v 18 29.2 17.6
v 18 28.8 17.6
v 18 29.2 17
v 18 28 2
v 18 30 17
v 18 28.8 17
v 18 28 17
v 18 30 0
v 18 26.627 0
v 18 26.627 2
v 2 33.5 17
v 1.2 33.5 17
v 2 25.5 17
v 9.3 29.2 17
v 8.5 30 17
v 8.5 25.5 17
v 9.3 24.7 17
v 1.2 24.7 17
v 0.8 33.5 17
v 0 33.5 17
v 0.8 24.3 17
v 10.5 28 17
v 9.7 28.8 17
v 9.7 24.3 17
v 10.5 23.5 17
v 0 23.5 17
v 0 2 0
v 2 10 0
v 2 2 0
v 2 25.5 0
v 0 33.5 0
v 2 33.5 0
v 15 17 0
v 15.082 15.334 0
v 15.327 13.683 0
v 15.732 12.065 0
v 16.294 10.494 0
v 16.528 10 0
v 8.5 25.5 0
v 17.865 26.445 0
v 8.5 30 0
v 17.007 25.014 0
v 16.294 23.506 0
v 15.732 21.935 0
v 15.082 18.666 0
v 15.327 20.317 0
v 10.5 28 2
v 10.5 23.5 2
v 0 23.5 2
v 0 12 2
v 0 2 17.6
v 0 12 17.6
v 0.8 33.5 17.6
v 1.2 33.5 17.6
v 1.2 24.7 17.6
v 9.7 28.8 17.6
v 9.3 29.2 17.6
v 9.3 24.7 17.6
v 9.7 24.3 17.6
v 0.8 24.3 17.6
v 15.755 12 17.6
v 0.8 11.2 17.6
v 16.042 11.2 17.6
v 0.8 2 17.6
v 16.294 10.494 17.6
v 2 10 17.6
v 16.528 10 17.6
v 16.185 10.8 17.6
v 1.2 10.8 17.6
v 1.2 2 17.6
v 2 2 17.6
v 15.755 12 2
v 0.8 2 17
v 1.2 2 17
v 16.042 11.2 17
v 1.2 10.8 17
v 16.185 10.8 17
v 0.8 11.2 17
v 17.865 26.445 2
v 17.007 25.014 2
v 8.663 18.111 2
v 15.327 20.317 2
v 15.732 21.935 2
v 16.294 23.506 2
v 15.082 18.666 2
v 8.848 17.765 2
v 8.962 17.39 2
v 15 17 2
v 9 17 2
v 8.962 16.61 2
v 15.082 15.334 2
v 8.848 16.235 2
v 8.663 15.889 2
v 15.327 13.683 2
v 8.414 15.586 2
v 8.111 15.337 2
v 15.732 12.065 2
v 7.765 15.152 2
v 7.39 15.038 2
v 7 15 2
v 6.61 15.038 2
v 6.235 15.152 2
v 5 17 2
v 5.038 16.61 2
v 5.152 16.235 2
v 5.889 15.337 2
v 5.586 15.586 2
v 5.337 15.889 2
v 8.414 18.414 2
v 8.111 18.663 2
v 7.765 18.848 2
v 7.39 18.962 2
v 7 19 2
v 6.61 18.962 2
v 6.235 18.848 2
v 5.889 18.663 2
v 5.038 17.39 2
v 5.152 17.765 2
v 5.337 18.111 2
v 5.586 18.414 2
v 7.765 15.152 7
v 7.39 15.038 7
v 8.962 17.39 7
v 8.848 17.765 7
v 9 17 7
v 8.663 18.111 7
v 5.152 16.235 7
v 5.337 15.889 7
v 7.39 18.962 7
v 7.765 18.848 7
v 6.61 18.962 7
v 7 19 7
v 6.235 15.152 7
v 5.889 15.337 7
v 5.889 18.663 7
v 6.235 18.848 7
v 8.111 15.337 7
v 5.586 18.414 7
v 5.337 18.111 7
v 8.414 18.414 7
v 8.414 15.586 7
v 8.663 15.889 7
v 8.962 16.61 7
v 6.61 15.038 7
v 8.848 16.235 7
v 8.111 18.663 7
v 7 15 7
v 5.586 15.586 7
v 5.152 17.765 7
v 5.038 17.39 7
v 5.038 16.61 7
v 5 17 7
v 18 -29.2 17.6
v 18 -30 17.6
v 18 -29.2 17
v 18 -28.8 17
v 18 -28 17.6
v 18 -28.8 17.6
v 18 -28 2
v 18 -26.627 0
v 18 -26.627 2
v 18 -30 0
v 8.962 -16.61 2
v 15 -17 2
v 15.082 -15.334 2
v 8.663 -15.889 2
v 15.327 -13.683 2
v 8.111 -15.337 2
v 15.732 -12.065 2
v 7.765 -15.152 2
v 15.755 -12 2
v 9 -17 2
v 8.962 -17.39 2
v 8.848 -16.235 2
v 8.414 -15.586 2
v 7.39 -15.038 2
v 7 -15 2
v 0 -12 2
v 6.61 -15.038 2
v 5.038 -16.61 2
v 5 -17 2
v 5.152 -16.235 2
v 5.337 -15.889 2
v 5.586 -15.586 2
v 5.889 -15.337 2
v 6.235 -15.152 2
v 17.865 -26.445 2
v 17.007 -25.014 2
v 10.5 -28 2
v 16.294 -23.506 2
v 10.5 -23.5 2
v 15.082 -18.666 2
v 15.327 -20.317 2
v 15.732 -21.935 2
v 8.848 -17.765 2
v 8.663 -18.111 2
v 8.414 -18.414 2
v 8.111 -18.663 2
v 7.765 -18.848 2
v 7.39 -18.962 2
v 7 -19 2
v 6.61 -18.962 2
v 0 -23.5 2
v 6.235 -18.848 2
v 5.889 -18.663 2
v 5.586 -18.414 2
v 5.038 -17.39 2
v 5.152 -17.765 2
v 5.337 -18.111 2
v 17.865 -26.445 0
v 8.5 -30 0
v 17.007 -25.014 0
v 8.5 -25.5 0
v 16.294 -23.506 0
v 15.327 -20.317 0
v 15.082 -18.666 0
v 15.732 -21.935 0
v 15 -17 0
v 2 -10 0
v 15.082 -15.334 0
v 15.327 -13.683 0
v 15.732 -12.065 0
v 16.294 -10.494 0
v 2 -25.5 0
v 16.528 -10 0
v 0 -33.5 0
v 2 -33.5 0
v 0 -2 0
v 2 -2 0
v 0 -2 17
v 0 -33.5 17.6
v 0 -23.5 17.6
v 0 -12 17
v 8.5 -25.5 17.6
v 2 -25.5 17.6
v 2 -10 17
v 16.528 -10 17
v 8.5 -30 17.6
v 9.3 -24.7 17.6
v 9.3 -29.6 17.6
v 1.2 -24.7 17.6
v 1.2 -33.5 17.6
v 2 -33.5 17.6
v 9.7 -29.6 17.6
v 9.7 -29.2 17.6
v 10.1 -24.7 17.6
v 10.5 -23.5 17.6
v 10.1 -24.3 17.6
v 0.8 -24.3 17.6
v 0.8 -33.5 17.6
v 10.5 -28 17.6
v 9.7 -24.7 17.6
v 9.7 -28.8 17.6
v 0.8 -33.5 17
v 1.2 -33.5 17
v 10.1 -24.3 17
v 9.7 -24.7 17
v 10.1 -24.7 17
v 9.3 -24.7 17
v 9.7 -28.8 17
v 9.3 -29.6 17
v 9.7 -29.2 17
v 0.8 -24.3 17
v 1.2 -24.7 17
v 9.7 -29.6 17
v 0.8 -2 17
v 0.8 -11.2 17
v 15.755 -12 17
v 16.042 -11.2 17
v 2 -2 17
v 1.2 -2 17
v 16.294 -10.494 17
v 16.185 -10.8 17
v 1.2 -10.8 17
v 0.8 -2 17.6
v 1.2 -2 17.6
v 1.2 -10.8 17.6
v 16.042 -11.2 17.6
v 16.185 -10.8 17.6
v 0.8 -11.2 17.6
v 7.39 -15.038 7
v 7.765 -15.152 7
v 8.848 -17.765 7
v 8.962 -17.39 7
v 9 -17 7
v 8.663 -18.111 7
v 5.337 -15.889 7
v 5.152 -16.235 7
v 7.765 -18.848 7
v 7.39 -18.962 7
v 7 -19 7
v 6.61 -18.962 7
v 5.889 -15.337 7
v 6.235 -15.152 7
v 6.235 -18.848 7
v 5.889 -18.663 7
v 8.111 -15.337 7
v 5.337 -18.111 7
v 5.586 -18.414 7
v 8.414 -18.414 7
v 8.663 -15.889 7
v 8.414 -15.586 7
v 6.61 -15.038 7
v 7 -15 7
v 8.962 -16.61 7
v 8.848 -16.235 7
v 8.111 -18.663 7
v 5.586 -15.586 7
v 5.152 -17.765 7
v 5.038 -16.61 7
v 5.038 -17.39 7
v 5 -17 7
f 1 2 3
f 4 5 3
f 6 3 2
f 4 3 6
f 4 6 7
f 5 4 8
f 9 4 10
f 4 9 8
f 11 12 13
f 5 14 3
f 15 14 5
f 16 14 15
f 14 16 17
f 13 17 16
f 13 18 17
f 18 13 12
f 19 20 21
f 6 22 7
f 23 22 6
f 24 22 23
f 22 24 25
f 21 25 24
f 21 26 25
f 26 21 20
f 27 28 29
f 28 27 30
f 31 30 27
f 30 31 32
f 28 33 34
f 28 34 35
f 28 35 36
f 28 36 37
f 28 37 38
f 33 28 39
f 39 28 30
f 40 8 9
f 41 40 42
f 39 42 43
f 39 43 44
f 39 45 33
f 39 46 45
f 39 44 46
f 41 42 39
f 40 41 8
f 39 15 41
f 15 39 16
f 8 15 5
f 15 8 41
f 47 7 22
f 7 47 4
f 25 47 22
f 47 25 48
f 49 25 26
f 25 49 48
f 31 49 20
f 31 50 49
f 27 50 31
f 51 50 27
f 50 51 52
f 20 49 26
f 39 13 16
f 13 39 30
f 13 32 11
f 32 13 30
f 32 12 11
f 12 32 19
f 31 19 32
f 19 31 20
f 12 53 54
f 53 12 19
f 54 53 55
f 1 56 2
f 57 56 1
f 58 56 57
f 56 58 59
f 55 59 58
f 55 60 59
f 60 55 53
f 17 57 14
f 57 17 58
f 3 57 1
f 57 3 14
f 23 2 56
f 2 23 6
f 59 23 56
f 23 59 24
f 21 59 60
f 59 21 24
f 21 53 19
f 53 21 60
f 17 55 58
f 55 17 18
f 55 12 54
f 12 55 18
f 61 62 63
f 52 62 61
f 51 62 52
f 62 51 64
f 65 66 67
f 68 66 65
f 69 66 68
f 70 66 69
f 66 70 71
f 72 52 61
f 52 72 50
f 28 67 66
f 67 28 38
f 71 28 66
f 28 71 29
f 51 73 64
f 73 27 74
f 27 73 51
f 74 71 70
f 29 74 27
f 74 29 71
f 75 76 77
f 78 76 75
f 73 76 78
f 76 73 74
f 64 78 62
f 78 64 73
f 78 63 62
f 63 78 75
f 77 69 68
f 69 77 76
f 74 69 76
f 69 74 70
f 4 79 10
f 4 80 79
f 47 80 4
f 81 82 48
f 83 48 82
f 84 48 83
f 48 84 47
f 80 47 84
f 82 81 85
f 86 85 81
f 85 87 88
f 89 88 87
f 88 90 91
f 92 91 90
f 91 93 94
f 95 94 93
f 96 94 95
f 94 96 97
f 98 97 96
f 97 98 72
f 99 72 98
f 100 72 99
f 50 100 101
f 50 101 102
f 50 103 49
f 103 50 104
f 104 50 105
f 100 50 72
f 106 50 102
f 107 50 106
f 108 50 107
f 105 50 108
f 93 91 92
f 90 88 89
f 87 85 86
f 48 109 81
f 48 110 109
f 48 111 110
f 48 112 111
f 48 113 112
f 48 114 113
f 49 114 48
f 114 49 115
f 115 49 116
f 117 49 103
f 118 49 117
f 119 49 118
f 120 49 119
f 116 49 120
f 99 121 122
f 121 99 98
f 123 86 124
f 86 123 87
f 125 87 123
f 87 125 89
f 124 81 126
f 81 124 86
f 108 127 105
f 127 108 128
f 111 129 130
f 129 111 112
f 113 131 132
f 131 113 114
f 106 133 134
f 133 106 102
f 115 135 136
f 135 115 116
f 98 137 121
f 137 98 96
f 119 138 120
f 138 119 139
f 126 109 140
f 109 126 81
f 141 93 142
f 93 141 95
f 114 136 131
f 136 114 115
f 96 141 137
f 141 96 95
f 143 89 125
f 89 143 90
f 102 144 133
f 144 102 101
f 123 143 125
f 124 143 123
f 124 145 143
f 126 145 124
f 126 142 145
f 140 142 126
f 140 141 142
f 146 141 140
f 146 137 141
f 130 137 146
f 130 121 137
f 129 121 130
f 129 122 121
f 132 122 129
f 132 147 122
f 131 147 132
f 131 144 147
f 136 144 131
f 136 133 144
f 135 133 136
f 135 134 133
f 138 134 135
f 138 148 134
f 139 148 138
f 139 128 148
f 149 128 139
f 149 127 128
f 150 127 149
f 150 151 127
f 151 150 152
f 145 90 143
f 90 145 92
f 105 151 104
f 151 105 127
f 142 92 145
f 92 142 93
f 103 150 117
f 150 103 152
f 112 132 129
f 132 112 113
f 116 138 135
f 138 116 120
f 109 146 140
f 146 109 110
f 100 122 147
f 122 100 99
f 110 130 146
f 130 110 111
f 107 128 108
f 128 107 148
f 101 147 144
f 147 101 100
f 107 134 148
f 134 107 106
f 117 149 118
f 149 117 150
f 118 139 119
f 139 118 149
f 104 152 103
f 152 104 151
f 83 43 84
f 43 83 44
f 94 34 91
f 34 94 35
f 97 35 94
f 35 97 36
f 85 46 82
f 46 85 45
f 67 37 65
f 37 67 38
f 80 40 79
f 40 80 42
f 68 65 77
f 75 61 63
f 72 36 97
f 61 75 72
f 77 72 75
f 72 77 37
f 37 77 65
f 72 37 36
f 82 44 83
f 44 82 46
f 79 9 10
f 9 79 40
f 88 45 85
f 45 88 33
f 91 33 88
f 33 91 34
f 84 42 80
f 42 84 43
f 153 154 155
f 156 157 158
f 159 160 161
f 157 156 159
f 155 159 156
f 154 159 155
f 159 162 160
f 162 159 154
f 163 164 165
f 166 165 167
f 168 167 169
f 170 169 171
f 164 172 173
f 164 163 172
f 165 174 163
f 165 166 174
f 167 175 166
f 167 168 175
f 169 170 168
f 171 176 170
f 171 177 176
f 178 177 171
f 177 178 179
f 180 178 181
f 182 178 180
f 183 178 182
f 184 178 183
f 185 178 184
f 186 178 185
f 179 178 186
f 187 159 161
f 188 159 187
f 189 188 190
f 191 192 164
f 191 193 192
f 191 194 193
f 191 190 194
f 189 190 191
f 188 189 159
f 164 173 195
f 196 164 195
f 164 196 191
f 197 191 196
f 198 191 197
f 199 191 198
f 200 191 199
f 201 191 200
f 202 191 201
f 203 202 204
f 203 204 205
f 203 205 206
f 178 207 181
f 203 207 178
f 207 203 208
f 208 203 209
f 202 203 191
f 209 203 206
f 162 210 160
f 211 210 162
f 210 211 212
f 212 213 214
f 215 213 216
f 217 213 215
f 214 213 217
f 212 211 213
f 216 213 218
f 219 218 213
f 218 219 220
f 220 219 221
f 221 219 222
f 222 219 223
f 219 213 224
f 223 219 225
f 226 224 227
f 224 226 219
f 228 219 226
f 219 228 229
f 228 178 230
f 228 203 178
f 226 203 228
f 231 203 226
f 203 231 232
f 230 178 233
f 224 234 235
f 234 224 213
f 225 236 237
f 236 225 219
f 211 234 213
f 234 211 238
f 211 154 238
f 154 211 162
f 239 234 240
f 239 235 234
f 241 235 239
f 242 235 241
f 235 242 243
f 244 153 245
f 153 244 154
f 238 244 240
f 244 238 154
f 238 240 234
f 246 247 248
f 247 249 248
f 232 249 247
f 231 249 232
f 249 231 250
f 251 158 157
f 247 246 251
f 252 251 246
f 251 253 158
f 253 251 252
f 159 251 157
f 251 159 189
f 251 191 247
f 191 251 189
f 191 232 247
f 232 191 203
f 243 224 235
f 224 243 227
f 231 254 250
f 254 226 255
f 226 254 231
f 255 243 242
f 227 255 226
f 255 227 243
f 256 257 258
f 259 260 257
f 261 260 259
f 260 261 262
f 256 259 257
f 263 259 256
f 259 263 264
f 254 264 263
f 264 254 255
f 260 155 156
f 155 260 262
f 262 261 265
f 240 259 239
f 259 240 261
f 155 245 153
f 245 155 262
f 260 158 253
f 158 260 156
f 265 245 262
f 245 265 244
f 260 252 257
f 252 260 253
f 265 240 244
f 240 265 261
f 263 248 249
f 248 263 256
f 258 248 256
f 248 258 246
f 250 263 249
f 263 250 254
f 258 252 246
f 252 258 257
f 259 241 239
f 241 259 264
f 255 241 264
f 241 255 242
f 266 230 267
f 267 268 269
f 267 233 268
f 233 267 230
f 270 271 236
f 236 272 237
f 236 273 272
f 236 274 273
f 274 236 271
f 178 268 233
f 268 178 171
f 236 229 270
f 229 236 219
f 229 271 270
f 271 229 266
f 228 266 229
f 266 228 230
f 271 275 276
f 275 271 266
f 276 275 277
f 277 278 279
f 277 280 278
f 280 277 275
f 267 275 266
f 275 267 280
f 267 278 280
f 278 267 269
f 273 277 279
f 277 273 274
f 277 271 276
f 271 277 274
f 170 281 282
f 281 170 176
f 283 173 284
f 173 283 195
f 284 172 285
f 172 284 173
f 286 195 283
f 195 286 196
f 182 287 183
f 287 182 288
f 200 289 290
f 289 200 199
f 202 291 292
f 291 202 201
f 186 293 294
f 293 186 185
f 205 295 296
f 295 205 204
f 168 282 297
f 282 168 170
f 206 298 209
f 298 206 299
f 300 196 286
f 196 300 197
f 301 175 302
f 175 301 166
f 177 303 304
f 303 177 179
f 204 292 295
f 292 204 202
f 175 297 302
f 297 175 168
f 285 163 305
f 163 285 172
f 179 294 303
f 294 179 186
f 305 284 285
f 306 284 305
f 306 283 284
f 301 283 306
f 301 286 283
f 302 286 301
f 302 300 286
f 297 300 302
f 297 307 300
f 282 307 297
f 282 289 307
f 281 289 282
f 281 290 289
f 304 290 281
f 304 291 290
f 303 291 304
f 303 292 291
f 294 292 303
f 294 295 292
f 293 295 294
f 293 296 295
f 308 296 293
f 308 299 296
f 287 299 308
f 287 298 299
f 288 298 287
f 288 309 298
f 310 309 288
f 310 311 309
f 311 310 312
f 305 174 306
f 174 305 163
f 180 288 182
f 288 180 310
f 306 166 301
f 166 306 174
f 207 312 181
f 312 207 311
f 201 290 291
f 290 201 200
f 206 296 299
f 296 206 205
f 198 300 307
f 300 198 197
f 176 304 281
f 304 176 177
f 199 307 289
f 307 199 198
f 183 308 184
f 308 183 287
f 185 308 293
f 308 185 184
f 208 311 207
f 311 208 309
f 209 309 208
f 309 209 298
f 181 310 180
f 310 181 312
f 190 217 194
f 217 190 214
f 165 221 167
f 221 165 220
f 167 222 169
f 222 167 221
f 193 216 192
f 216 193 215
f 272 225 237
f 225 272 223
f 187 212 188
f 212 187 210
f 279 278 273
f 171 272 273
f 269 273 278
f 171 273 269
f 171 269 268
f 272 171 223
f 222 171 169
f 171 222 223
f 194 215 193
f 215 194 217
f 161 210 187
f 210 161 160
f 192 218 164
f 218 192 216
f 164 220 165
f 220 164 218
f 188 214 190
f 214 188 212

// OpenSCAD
WALL_WIDTH = 2;
WALL_HEIGHT = 17;
CHANNEL_WIDTH = 0.4;
CHANNEL_HEIGHT = 0.6;
EDGE_WIDTH = (WALL_WIDTH-CHANNEL_WIDTH)/2;

module zig_zag_wall(inner) {
  lengths = [9.5, 4.5, 8.5, 8];
  extended_length = inner ?
    [
      lengths[0]-EDGE_WIDTH,
      lengths[1],
      lengths[2],
      lengths[3]+EDGE_WIDTH
    ] : [
      lengths[0],
      lengths[1]+EDGE_WIDTH,
      lengths[2]+EDGE_WIDTH,
      lengths[3]+(2*EDGE_WIDTH)
    ];

  wall_height = inner ? WALL_HEIGHT : WALL_HEIGHT + CHANNEL_HEIGHT;
  channel_height = inner ? CHANNEL_HEIGHT : CHANNEL_HEIGHT + 1;
  position = inner ?
    -lengths[1]+EDGE_WIDTH+CHANNEL_WIDTH :
    -lengths[1]+(EDGE_WIDTH/2)+CHANNEL_WIDTH;

  conditional_difference(inner) {
    union() {
      cube([lengths[0], WALL_WIDTH, wall_height]);

      translate([0, -lengths[1], 0])
        cube([WALL_WIDTH, lengths[1], wall_height]);

      translate([-lengths[2], -lengths[1], 0])
        cube([lengths[2], WALL_WIDTH, wall_height]);

      translate([-lengths[2], -lengths[1]+WALL_WIDTH, 0])
        cube([WALL_WIDTH, lengths[3], wall_height]);
    }

    translate([EDGE_WIDTH, EDGE_WIDTH, WALL_HEIGHT])
      cube([extended_length[0], CHANNEL_WIDTH, channel_height]);

    translate([EDGE_WIDTH, -lengths[1]+EDGE_WIDTH, WALL_HEIGHT])
      cube([CHANNEL_WIDTH, extended_length[1], channel_height]);

    translate([-lengths[2]+EDGE_WIDTH, -lengths[1]+EDGE_WIDTH, WALL_HEIGHT])
      cube([extended_length[2], CHANNEL_WIDTH, channel_height]);

    translate([-lengths[2]+EDGE_WIDTH, position, WALL_HEIGHT])
      cube([CHANNEL_WIDTH, extended_length[3], channel_height]);
  }
}

module straight_wall(inner) {
  lengths = [18, 8];
  extended_lengths = inner ? [
    lengths[0] - EDGE_WIDTH,
    lengths[1] + EDGE_WIDTH
  ]: [
    lengths[0] + 2,
    lengths[1] + 2
  ];

  wall_height = inner ? WALL_HEIGHT : WALL_HEIGHT + CHANNEL_HEIGHT;
  channel_height = inner ? CHANNEL_HEIGHT : CHANNEL_HEIGHT + 1;
  position = inner ? -lengths[1] : -lengths[1] - EDGE_WIDTH;

  conditional_difference(inner) {
    union() {
      cube([lengths[0], WALL_WIDTH, wall_height]);

      translate([0, -lengths[1], 0])
        cube([WALL_WIDTH, lengths[1], wall_height]);
    }

    translate([EDGE_WIDTH, EDGE_WIDTH, WALL_HEIGHT])
      cube([extended_lengths[0], CHANNEL_WIDTH, channel_height]);

    translate([EDGE_WIDTH, position, WALL_HEIGHT])
      cube([CHANNEL_WIDTH, extended_lengths[1], channel_height]);
  }
}

module conditional_difference(inner) {
  if (inner) {
    children();
  } else {
    difference() {
      children(0);
      children([1:$children-1]);
    }
  }
}

module bottom_wall() {
  cube([18, 15.5, WALL_WIDTH]);

  translate([8.5, 15.5])
    cube([9.5, 4.5, WALL_WIDTH]);
}

module peg() {
  cylinder(r=2, h=5, $fn=32);
}

module clamp(inner) {
  difference() {
    union() {
      translate([8.5, 18, 0])
        zig_zag_wall(inner);

      straight_wall(!inner);

      #bottom_wall();

      translate([7, 7, 2])
        peg();
    }

    translate([32, 7, -1])
      cylinder(r=17, h=WALL_HEIGHT+CHANNEL_HEIGHT+2, $fn=64);
  }
}

translate([0, 10, 0])
  clamp(true);

translate([0, -10, 0])
  mirror([0, 1, 0])
    clamp(false);
